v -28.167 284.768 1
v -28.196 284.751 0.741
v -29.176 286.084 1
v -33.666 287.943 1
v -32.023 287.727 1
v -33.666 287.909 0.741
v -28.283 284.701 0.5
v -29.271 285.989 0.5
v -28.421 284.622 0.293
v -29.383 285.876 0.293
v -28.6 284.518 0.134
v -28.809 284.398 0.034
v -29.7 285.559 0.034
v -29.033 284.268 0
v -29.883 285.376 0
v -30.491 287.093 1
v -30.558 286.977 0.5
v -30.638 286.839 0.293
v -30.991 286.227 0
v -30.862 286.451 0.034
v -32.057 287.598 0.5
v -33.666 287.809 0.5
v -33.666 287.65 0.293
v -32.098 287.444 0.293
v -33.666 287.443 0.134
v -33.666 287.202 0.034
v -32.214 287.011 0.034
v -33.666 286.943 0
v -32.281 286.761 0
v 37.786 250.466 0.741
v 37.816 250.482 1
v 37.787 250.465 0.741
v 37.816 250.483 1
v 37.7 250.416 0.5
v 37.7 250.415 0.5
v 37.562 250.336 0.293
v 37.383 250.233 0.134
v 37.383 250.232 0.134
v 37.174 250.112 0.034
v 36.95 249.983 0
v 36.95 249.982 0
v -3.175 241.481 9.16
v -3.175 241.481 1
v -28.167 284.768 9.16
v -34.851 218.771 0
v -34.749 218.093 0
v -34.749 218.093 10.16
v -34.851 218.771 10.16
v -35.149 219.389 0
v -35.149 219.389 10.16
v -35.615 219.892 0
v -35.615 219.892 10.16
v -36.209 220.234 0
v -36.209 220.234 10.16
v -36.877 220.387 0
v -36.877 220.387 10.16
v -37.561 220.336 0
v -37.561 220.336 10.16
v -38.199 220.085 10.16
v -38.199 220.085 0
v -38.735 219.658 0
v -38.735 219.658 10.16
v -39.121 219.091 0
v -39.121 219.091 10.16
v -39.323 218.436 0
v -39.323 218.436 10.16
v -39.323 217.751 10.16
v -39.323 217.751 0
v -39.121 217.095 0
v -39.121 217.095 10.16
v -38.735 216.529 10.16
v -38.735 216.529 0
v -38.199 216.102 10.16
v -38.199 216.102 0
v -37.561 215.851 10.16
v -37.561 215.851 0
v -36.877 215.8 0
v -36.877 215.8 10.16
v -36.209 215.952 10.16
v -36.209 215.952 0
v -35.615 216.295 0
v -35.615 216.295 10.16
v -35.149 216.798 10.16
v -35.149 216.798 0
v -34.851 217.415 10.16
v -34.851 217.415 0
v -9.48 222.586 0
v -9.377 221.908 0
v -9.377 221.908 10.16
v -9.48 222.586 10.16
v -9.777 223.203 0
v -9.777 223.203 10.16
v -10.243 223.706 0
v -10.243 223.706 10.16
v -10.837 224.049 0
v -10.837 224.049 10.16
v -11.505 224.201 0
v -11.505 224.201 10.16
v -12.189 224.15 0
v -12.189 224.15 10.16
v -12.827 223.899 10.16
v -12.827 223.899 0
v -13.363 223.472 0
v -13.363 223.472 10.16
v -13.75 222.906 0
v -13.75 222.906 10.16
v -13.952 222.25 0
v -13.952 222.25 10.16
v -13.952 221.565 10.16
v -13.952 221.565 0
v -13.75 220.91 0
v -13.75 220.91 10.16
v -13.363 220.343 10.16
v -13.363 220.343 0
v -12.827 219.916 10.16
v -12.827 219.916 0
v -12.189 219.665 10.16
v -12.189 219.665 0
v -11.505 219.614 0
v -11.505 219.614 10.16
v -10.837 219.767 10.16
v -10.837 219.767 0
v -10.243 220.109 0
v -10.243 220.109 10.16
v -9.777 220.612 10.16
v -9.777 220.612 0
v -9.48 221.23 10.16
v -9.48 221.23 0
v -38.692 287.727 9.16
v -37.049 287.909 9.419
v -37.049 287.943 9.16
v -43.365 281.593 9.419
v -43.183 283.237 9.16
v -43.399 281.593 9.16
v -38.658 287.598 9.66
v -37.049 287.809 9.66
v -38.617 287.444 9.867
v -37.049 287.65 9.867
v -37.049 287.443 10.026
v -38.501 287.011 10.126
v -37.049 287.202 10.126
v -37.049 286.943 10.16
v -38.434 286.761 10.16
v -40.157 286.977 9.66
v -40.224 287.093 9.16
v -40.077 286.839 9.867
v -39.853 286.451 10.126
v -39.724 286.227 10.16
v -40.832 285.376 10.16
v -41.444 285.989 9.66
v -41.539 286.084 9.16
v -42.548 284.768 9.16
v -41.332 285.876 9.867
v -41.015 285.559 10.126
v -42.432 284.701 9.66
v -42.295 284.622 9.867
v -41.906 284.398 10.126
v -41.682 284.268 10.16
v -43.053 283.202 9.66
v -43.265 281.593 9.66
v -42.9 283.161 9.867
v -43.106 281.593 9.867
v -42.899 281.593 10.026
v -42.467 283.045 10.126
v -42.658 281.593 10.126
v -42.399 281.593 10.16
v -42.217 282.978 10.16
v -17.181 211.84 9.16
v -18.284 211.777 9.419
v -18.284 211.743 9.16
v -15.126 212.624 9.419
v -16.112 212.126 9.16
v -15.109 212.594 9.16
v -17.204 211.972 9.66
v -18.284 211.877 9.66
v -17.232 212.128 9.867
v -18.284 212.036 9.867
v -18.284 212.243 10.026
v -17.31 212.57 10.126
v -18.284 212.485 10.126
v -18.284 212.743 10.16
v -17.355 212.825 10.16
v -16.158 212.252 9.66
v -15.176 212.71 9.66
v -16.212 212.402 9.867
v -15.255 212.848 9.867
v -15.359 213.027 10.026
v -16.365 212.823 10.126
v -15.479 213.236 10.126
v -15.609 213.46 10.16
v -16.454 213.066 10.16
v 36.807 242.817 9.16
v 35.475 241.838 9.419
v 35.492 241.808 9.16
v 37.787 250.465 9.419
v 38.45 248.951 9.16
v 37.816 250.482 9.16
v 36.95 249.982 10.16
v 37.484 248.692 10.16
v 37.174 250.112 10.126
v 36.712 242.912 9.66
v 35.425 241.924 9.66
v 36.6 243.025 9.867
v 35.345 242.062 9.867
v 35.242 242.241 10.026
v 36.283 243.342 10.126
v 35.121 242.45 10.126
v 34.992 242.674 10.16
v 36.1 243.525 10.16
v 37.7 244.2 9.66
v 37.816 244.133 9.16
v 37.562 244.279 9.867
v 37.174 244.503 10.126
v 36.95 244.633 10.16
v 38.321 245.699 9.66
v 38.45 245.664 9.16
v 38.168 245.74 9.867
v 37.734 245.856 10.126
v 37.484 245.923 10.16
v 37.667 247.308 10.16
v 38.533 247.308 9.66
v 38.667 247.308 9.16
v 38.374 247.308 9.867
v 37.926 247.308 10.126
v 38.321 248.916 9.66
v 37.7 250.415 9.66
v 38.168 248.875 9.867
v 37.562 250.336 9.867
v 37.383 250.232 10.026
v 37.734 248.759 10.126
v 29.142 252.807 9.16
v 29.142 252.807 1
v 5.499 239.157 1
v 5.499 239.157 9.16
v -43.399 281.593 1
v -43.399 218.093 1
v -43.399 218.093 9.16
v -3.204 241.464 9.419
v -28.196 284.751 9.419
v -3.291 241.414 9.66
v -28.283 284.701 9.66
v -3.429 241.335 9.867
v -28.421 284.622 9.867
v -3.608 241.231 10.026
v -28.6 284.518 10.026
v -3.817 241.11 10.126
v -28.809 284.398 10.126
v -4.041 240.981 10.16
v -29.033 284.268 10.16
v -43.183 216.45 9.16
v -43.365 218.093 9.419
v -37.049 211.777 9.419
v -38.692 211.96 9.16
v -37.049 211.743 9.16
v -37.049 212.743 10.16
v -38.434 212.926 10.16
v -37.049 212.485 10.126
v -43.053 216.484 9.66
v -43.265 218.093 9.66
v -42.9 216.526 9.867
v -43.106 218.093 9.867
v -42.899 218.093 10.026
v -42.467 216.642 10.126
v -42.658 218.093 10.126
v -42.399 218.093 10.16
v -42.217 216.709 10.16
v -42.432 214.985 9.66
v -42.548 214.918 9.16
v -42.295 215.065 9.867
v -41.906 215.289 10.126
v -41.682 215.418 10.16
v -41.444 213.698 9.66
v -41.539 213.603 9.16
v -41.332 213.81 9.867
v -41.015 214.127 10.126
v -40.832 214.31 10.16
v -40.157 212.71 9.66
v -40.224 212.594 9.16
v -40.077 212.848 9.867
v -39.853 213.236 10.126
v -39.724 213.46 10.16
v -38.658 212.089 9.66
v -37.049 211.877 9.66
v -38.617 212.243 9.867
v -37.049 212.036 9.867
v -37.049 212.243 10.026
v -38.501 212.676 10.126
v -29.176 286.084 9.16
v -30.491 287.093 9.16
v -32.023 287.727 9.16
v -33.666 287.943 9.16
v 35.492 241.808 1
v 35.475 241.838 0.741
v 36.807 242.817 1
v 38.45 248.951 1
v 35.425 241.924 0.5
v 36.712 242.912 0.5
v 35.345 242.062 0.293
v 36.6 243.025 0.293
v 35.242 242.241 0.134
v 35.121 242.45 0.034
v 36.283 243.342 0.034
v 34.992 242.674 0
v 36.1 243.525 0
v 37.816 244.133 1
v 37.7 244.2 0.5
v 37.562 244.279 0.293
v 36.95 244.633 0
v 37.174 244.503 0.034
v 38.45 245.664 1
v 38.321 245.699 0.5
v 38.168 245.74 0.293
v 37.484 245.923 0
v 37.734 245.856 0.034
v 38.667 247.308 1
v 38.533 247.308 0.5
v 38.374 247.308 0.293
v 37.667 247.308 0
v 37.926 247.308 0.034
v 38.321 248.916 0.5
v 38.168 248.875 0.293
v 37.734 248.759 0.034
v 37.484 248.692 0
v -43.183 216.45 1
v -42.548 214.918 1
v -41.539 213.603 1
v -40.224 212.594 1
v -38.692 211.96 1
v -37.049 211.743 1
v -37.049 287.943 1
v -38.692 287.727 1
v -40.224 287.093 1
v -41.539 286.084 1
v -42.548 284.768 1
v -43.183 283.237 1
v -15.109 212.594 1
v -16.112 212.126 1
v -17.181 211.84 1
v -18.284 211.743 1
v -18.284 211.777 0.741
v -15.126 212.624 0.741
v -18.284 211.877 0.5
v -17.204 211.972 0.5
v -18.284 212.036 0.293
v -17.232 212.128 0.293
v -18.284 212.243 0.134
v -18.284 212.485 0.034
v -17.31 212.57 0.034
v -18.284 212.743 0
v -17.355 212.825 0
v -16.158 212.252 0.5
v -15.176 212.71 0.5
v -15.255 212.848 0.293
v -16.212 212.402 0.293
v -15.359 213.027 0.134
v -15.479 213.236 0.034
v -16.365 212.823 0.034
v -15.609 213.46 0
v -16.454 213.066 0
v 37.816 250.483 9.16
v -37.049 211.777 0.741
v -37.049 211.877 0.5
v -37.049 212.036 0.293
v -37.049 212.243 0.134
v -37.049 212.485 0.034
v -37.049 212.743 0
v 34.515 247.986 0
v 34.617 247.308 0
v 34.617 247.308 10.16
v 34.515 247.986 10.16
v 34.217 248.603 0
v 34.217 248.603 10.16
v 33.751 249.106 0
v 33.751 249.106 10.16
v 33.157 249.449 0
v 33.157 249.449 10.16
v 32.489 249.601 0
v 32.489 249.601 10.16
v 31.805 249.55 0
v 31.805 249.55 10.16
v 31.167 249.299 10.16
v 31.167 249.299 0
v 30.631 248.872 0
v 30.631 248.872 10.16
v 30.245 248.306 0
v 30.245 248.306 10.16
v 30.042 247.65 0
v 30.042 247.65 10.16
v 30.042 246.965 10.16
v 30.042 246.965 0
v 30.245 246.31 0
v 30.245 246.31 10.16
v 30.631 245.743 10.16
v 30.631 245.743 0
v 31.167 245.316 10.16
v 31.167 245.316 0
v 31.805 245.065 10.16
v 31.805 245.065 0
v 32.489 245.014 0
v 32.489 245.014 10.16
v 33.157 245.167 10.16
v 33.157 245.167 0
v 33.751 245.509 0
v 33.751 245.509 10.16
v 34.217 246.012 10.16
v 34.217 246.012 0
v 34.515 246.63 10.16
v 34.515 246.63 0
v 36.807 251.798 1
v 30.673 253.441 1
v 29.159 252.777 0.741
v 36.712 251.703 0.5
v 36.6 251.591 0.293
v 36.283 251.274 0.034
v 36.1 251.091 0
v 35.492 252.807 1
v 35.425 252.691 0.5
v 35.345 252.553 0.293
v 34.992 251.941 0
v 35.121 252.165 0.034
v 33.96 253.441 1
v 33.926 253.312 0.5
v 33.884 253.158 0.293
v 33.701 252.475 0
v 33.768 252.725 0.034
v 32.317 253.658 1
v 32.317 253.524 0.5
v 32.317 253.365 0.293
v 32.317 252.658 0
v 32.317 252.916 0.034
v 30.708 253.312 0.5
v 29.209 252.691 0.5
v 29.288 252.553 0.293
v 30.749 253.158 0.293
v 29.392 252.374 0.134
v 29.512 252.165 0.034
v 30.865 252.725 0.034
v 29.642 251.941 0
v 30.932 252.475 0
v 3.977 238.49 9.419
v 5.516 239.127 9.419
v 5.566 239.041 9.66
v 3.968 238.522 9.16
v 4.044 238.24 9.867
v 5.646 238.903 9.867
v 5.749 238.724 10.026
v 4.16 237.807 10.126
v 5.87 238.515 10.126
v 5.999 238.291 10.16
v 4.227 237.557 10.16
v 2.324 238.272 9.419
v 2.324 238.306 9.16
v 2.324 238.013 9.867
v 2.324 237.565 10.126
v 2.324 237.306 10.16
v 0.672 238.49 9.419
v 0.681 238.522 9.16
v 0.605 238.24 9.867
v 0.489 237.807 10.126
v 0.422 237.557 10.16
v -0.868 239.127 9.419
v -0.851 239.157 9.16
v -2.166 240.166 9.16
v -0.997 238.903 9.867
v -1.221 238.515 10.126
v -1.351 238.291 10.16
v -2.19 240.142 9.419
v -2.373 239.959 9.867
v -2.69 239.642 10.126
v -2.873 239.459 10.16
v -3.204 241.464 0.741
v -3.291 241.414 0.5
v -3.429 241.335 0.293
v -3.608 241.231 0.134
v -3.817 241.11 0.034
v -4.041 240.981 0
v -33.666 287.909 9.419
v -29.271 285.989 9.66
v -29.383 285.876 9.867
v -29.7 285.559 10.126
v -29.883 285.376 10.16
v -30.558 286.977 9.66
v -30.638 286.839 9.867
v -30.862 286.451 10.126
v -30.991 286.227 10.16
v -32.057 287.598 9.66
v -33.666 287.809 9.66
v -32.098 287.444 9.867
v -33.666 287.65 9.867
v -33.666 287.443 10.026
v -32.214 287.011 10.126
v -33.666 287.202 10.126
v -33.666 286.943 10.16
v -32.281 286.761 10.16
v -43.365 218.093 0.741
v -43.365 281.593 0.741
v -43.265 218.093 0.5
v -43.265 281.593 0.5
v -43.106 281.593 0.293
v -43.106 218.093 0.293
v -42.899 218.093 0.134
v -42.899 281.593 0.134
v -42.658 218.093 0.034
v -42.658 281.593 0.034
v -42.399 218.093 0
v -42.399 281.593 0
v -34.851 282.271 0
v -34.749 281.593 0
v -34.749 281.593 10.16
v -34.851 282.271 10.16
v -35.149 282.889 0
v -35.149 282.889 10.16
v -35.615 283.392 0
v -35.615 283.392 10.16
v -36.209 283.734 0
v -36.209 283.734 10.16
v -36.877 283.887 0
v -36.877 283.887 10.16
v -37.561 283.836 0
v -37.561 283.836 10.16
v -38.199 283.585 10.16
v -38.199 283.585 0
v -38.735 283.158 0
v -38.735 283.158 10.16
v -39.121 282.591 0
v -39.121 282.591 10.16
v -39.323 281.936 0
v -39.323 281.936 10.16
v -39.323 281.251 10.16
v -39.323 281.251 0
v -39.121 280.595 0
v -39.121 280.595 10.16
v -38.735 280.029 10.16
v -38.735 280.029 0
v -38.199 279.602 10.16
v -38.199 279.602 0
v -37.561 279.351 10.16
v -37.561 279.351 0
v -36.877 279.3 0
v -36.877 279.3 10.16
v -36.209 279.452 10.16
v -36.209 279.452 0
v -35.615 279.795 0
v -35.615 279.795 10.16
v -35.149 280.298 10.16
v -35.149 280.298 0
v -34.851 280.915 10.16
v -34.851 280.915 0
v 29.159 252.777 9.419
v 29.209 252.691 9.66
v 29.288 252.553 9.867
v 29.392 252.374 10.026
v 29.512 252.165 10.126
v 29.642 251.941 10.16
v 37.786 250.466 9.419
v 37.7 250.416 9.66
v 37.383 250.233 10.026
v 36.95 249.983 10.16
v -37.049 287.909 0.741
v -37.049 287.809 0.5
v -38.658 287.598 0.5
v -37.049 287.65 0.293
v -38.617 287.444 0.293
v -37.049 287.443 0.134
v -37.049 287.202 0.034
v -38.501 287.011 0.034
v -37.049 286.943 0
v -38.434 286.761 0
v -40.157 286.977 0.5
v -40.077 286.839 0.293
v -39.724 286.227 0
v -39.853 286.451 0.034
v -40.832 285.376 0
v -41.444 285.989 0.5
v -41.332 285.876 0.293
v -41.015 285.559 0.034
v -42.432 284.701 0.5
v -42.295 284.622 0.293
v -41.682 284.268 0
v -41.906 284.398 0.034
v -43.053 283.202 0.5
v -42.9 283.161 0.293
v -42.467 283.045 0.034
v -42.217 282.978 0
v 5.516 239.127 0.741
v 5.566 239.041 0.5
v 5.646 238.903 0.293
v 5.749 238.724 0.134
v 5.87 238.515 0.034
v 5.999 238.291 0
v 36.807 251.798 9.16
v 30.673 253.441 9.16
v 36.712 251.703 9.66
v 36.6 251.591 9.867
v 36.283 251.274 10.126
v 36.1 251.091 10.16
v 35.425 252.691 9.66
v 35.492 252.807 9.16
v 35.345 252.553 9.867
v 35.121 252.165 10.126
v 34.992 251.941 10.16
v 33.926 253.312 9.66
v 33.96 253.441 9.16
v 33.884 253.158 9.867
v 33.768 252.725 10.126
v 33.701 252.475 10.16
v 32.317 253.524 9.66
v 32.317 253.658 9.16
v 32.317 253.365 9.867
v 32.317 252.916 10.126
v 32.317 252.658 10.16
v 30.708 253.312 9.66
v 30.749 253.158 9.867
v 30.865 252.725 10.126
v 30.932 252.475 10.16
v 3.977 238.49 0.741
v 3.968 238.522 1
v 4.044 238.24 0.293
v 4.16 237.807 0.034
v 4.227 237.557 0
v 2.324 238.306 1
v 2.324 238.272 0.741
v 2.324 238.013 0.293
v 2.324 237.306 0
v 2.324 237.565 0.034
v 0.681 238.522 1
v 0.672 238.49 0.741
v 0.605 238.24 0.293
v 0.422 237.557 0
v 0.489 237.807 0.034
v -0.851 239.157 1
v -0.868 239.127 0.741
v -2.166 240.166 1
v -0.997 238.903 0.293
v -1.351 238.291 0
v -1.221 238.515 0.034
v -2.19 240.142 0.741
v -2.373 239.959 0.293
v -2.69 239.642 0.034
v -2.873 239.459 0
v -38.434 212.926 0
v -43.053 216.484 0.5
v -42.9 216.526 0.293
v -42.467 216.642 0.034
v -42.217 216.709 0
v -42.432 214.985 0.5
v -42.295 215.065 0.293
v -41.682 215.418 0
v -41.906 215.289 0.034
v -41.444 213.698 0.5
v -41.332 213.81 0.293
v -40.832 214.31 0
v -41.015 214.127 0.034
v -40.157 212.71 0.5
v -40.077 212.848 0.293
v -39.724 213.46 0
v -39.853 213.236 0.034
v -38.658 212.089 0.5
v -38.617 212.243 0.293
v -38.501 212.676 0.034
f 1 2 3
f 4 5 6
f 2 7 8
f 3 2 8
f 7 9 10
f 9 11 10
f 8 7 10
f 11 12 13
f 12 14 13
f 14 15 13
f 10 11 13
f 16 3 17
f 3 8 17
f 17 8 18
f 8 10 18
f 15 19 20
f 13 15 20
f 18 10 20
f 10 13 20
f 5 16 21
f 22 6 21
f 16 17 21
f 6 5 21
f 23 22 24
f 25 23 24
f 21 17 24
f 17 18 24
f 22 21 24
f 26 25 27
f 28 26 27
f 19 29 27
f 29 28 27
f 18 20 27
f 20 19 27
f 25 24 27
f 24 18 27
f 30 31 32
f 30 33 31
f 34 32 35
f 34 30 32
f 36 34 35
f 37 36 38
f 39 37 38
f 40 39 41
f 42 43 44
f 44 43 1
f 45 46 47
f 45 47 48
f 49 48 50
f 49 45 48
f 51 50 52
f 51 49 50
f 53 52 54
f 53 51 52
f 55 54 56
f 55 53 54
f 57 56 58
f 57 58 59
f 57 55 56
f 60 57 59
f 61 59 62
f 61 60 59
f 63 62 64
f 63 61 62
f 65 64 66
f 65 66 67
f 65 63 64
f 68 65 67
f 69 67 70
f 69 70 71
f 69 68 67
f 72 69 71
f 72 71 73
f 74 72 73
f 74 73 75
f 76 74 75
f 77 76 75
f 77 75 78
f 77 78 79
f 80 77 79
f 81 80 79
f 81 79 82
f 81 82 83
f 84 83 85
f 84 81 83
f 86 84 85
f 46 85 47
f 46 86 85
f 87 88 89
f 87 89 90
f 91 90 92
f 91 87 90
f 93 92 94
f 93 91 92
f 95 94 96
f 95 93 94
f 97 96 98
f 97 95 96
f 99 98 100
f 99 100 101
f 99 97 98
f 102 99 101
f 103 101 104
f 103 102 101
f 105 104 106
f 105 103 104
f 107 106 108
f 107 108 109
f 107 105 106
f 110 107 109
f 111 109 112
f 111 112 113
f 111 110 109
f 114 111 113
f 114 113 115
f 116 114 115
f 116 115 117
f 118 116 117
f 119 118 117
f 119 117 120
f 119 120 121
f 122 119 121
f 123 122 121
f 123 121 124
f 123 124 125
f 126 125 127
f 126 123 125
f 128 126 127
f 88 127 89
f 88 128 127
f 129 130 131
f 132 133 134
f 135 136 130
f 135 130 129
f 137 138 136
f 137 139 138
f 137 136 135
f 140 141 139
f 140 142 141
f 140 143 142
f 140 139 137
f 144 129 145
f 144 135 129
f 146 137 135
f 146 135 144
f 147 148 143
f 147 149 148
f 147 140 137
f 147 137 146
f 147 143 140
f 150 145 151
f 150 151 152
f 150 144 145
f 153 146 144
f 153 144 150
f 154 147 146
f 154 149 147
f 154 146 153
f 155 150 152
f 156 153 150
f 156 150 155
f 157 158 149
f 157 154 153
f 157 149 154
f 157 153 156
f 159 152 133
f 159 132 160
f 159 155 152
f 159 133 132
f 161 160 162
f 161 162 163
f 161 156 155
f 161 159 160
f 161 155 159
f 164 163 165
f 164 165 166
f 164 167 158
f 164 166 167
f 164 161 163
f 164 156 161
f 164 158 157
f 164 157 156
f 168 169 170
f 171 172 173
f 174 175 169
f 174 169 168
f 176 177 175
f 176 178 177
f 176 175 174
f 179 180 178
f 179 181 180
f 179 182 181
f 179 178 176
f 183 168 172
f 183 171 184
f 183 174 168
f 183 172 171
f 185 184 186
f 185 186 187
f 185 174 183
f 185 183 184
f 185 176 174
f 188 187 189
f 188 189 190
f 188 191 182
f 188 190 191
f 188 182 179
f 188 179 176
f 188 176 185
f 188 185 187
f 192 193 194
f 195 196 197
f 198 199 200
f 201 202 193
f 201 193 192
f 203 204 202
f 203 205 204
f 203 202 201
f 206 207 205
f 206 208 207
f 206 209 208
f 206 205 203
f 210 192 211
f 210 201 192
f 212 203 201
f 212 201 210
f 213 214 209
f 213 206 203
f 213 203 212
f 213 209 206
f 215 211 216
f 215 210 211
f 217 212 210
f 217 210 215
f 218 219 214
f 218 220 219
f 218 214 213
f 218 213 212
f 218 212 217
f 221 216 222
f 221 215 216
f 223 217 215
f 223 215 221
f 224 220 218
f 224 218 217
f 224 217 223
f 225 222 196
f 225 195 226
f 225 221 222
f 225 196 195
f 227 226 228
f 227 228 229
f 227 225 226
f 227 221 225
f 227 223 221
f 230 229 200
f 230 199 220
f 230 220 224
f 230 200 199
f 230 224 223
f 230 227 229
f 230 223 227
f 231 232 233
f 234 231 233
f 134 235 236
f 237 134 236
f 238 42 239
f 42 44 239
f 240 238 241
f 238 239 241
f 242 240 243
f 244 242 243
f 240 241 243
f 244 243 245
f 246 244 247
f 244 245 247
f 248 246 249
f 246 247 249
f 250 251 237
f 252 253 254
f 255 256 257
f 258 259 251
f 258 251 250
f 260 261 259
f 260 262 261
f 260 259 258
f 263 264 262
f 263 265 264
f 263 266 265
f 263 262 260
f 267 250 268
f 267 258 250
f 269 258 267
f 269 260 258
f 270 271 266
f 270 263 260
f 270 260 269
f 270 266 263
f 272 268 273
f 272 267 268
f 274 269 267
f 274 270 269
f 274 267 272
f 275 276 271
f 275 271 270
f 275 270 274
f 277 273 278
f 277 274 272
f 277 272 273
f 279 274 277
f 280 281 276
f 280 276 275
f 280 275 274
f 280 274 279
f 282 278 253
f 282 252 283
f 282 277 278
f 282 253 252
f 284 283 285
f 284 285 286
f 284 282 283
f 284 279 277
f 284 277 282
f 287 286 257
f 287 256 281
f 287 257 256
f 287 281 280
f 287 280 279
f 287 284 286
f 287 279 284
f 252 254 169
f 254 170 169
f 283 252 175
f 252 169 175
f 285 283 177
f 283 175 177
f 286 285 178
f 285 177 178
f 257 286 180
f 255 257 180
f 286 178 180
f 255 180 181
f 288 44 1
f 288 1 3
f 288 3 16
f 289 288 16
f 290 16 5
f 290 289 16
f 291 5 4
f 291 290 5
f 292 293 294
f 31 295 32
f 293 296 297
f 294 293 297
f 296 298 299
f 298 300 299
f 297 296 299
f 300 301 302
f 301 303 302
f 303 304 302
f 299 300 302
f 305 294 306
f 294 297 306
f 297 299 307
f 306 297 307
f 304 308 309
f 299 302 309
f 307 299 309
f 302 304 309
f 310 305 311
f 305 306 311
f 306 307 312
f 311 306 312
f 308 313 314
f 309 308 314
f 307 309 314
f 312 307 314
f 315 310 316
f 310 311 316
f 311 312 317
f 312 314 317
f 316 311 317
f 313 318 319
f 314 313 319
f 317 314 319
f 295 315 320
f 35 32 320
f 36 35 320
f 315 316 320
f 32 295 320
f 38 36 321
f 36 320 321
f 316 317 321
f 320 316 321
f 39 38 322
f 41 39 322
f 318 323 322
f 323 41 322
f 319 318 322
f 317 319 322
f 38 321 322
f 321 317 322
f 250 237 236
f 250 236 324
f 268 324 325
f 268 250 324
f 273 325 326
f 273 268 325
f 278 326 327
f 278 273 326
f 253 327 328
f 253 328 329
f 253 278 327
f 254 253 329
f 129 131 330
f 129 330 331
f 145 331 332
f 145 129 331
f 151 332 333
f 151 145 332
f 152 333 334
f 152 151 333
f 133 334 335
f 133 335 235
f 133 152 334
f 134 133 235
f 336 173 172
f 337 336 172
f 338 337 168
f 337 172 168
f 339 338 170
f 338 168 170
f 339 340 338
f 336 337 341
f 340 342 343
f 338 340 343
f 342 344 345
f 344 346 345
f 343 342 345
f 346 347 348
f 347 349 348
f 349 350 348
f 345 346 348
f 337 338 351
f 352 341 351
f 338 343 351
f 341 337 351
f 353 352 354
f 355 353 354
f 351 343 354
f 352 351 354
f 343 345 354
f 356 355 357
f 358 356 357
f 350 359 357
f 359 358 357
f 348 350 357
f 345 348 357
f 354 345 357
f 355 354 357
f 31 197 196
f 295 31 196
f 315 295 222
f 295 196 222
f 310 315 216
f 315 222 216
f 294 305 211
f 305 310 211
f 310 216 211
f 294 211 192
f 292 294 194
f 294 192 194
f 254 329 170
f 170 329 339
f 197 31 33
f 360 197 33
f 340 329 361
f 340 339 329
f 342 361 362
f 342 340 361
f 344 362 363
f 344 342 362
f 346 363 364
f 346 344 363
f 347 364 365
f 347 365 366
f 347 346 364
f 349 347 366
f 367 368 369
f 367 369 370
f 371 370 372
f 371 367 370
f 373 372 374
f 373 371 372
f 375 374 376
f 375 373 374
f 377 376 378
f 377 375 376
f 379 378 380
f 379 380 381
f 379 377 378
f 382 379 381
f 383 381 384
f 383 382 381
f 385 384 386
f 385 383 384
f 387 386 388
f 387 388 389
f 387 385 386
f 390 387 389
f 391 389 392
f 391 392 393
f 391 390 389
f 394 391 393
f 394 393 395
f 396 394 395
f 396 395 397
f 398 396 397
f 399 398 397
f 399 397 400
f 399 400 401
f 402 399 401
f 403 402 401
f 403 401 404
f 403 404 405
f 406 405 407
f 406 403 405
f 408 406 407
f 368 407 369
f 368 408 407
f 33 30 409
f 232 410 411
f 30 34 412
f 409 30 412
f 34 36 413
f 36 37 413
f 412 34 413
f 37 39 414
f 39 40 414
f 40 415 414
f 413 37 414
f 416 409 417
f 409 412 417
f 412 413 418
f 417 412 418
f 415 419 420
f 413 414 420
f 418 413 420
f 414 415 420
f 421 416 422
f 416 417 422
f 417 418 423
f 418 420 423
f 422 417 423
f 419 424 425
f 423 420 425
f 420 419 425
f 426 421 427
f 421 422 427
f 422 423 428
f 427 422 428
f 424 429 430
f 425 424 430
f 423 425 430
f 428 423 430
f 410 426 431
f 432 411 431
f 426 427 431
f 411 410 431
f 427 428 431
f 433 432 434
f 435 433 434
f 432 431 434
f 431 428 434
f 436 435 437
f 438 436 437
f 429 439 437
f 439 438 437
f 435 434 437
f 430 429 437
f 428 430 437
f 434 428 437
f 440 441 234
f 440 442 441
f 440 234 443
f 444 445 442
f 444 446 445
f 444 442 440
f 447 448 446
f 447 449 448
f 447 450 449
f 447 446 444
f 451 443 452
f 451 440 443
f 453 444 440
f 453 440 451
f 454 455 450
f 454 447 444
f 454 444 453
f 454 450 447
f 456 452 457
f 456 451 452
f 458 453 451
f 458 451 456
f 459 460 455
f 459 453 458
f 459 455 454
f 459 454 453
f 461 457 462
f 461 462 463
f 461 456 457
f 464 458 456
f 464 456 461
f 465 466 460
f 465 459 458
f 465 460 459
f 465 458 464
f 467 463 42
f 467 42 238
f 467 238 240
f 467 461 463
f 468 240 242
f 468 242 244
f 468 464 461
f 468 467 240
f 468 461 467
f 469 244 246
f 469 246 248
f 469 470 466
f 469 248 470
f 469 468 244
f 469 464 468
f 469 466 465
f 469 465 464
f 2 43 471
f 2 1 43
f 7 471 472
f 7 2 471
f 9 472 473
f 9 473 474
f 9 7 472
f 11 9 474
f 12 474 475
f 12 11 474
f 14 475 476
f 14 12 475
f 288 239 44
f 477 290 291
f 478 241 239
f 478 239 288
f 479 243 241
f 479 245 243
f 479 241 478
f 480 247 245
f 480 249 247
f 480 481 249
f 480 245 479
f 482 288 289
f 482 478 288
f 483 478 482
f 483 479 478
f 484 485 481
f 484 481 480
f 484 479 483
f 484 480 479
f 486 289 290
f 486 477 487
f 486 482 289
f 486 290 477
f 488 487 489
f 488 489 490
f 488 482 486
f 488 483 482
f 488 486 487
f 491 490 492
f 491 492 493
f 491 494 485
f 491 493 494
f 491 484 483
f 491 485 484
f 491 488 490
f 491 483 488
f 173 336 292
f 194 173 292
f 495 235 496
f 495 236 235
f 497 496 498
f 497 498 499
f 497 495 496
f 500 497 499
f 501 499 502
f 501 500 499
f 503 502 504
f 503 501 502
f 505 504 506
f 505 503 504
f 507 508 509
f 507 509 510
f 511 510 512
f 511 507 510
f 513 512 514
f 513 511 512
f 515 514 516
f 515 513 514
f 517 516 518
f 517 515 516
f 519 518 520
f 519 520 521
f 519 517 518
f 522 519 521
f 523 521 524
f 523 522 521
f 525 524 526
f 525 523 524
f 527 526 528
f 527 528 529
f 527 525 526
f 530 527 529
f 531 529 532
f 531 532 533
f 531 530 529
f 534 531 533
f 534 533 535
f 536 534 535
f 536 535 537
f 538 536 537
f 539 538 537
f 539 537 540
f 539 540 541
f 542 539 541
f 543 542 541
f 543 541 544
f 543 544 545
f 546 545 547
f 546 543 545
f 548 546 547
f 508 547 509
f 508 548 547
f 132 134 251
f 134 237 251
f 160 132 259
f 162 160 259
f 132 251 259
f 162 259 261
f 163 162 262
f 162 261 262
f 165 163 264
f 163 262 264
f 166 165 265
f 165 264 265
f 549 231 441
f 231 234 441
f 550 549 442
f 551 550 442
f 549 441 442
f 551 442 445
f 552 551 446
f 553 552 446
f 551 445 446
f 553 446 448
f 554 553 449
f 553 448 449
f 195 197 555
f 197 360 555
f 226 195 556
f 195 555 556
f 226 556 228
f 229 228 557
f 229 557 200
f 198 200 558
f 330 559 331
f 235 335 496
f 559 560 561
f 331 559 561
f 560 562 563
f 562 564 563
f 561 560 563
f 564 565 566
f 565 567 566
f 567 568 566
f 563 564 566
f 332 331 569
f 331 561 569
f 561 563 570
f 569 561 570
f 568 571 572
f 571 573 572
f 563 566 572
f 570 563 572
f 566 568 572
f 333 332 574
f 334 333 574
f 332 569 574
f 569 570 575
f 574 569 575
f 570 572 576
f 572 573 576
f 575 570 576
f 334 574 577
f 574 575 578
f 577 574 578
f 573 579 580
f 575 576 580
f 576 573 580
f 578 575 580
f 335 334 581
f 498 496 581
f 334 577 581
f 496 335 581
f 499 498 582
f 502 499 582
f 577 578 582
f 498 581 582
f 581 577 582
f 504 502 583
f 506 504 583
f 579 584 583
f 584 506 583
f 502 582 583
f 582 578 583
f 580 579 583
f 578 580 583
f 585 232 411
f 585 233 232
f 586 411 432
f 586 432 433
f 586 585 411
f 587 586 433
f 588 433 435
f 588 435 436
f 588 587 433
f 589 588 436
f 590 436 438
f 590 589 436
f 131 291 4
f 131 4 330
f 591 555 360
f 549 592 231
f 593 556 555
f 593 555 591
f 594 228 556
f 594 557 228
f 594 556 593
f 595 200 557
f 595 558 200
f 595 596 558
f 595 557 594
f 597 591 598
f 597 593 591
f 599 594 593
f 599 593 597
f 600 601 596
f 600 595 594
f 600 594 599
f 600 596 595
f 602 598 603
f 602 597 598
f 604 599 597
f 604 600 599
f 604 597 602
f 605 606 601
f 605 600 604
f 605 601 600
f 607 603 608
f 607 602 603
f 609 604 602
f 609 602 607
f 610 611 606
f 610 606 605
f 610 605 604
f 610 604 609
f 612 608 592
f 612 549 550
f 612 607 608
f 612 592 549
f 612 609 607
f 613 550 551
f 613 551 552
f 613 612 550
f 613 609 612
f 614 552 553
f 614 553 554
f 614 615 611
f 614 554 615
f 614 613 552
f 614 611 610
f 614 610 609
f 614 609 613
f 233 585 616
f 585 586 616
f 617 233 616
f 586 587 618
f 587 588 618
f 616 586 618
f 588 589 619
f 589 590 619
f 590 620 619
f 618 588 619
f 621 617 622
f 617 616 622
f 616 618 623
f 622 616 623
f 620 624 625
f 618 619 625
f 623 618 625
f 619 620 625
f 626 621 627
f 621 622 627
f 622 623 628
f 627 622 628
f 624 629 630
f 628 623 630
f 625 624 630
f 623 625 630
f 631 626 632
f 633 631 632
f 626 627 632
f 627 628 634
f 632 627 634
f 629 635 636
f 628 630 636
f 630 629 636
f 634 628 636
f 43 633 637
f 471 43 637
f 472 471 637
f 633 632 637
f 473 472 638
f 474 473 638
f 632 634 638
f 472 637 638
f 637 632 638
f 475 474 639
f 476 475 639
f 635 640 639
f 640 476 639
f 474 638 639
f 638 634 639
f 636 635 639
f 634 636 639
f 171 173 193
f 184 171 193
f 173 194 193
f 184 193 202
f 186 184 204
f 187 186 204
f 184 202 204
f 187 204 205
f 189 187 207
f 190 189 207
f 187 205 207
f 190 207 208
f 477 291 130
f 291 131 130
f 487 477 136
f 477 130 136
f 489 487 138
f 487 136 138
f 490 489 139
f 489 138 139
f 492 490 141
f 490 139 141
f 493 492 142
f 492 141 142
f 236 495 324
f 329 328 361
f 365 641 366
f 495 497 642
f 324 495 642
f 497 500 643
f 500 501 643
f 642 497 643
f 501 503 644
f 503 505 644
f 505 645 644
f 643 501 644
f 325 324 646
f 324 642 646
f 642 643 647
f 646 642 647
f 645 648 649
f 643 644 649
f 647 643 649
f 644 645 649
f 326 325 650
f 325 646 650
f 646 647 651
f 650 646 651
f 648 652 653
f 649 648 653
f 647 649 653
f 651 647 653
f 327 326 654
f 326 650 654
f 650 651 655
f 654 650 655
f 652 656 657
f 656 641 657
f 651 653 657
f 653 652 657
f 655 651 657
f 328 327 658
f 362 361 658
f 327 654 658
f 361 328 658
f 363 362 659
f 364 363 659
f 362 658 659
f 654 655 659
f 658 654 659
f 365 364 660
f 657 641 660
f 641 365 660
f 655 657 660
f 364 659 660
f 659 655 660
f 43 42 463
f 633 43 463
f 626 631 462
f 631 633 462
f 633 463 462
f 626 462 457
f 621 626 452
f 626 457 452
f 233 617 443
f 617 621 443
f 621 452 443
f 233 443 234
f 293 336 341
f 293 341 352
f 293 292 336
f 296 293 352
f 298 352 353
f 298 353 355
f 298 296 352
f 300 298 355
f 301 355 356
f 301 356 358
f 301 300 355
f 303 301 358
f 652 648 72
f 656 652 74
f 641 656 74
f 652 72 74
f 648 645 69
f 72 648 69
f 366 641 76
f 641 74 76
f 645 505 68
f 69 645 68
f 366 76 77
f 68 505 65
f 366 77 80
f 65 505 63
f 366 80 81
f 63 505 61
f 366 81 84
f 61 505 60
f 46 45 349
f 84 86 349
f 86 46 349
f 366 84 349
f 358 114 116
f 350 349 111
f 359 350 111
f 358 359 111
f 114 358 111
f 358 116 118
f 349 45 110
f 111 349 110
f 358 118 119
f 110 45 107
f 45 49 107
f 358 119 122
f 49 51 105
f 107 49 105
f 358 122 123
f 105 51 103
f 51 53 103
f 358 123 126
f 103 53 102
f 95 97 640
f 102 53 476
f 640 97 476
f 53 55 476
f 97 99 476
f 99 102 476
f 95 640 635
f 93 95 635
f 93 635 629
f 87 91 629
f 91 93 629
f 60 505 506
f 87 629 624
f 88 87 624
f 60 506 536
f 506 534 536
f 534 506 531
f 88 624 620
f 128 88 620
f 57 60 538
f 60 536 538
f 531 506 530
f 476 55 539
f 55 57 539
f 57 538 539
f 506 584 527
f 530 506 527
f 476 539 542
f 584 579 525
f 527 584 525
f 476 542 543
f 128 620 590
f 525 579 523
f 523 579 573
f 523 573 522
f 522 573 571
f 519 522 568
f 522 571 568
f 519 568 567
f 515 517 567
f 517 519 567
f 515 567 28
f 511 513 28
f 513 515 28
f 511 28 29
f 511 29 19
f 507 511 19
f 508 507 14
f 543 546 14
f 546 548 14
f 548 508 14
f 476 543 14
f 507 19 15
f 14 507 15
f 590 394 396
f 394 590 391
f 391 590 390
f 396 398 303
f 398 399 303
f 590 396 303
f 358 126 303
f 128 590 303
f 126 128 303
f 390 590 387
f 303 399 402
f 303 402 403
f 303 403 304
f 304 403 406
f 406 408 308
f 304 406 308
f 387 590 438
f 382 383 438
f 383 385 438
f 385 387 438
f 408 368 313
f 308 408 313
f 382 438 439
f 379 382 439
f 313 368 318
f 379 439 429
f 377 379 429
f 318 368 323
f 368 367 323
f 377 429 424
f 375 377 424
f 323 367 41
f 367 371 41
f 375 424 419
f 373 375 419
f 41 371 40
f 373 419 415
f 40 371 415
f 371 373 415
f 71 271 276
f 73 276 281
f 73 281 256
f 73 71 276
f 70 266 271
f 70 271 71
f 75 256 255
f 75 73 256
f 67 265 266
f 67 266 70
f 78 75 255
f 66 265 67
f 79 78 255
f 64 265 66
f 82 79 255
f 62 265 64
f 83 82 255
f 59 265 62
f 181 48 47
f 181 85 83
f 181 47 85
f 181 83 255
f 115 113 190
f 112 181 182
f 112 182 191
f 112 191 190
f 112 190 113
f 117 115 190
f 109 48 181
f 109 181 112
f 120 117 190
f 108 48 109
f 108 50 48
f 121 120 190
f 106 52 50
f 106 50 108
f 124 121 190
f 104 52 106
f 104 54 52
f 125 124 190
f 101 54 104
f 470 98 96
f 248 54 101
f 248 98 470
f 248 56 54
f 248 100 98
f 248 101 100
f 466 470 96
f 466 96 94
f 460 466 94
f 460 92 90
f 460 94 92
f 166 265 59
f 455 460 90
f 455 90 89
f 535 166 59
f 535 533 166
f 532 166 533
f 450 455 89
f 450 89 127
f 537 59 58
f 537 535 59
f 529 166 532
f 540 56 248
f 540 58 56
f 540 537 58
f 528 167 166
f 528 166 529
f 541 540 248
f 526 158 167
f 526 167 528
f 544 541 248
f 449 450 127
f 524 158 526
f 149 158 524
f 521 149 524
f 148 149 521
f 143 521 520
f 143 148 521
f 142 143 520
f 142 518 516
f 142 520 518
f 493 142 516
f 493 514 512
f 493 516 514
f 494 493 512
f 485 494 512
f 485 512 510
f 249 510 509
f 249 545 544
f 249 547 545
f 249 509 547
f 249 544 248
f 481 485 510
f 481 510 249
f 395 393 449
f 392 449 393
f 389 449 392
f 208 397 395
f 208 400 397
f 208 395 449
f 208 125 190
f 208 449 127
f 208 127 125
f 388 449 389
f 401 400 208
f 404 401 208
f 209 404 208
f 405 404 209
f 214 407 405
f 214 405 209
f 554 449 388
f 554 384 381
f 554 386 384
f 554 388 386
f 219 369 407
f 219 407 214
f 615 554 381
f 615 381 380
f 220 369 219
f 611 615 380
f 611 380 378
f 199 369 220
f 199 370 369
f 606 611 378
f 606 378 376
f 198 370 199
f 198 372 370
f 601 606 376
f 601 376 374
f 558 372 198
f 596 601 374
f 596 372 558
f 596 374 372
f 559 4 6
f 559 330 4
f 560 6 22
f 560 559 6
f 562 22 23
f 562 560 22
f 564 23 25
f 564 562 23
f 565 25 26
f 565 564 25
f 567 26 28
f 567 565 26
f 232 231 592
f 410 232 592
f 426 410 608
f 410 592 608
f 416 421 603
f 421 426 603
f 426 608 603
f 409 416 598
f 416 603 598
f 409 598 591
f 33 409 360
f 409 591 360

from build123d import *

# Parameters (mm, degrees)
SKETCH1_R           = 2.3
BOSS_EXTRUDE1_DEPTH = 10.16
FILLET1_R           = 6.35
FILLET3_R           = 1


with BuildPart() as part:
    # Sketch1 → Boss-Extrude1 (new body)
    with BuildSketch(Plane.XY):
        Polygon((0, 235.981834591), (-30, 287.943358818), (-43.398894252, 287.943358818), (-43.398894252, 211.743358818), (-16.582271537, 211.743358818), (40.991016151, 244.983311963), (34.641016151, 255.981834591), align=None)
        with Locations((-37.048894252, 218.093358818)):
            Circle(SKETCH1_R, mode=Mode.SUBTRACT)
        with Locations((-37.048894252, 281.593358818)):
            Circle(SKETCH1_R, mode=Mode.SUBTRACT)
        with Locations((32.316754837, 247.307573277)):
            Circle(SKETCH1_R, mode=Mode.SUBTRACT)
        with Locations((-11.677335675, 221.907573277)):
            Circle(SKETCH1_R, mode=Mode.SUBTRACT)
    extrude(amount=BOSS_EXTRUDE1_DEPTH)

    # Fillet1
    fillet1_edges = [part.edges().sort_by_distance(p)[0] for p in [
        (-30, 287.943358818, 5.08),
        (-16.582271537, 211.743358818, 5.08),
        (-43.398894252, 211.743358818, 5.08),
        (-43.398894252, 287.943358818, 5.08),
        (34.641016151, 255.981834591, 5.08),
        (40.991016151, 244.983311963, 5.08),
        (0, 235.981834591, 5.08),
    ]]
    fillet(fillet1_edges, radius=FILLET1_R - 0.0001)  # a hair under: the kernel refuses the full size

    # Fillet3
    fillet3_edges = [part.edges().sort_by_distance(p)[0] for p in [
        (-15.670945881, 263.124709061, 0),
        (-15.670945881, 263.124709061, 10.16),
        (17.320508076, 245.981834591, 0),
        (17.320508076, 245.981834591, 10.16),
        (10.191534663, 227.201223035, 0),
        (-27.666358183, 211.743358818, 0),
        (-43.398894252, 249.843358818, 0),
        (-35.357555363, 287.943358818, 0),
        (-41.539051602, 286.083516168, 0),
        (-41.539051602, 213.603201469, 0),
        (-16.640247059, 211.959726414, 0),
        (-30.491166474, 287.09263353, 0),
        (38.450423844, 245.66406162, 0),
        (33.960266494, 253.441242284, 0),
        (-35.357555363, 287.943358818, 10.16),
        (-43.398894252, 249.843358818, 10.16),
        (-27.666358183, 211.743358818, 10.16),
        (10.191534663, 227.201223035, 10.16),
        (-41.539051602, 286.083516168, 10.16),
        (-41.539051602, 213.603201469, 10.16),
        (-16.640247059, 211.959726414, 10.16),
        (-30.491166474, 287.09263353, 10.16),
        (38.450423844, 245.66406162, 10.16),
        (33.960266494, 253.441242284, 10.16),
        (0.680749657, 238.522426898, 0),
        (0.680749657, 238.522426898, 10.16),
    ]]
    fillet(fillet3_edges, radius=FILLET3_R)


solid = part.part
